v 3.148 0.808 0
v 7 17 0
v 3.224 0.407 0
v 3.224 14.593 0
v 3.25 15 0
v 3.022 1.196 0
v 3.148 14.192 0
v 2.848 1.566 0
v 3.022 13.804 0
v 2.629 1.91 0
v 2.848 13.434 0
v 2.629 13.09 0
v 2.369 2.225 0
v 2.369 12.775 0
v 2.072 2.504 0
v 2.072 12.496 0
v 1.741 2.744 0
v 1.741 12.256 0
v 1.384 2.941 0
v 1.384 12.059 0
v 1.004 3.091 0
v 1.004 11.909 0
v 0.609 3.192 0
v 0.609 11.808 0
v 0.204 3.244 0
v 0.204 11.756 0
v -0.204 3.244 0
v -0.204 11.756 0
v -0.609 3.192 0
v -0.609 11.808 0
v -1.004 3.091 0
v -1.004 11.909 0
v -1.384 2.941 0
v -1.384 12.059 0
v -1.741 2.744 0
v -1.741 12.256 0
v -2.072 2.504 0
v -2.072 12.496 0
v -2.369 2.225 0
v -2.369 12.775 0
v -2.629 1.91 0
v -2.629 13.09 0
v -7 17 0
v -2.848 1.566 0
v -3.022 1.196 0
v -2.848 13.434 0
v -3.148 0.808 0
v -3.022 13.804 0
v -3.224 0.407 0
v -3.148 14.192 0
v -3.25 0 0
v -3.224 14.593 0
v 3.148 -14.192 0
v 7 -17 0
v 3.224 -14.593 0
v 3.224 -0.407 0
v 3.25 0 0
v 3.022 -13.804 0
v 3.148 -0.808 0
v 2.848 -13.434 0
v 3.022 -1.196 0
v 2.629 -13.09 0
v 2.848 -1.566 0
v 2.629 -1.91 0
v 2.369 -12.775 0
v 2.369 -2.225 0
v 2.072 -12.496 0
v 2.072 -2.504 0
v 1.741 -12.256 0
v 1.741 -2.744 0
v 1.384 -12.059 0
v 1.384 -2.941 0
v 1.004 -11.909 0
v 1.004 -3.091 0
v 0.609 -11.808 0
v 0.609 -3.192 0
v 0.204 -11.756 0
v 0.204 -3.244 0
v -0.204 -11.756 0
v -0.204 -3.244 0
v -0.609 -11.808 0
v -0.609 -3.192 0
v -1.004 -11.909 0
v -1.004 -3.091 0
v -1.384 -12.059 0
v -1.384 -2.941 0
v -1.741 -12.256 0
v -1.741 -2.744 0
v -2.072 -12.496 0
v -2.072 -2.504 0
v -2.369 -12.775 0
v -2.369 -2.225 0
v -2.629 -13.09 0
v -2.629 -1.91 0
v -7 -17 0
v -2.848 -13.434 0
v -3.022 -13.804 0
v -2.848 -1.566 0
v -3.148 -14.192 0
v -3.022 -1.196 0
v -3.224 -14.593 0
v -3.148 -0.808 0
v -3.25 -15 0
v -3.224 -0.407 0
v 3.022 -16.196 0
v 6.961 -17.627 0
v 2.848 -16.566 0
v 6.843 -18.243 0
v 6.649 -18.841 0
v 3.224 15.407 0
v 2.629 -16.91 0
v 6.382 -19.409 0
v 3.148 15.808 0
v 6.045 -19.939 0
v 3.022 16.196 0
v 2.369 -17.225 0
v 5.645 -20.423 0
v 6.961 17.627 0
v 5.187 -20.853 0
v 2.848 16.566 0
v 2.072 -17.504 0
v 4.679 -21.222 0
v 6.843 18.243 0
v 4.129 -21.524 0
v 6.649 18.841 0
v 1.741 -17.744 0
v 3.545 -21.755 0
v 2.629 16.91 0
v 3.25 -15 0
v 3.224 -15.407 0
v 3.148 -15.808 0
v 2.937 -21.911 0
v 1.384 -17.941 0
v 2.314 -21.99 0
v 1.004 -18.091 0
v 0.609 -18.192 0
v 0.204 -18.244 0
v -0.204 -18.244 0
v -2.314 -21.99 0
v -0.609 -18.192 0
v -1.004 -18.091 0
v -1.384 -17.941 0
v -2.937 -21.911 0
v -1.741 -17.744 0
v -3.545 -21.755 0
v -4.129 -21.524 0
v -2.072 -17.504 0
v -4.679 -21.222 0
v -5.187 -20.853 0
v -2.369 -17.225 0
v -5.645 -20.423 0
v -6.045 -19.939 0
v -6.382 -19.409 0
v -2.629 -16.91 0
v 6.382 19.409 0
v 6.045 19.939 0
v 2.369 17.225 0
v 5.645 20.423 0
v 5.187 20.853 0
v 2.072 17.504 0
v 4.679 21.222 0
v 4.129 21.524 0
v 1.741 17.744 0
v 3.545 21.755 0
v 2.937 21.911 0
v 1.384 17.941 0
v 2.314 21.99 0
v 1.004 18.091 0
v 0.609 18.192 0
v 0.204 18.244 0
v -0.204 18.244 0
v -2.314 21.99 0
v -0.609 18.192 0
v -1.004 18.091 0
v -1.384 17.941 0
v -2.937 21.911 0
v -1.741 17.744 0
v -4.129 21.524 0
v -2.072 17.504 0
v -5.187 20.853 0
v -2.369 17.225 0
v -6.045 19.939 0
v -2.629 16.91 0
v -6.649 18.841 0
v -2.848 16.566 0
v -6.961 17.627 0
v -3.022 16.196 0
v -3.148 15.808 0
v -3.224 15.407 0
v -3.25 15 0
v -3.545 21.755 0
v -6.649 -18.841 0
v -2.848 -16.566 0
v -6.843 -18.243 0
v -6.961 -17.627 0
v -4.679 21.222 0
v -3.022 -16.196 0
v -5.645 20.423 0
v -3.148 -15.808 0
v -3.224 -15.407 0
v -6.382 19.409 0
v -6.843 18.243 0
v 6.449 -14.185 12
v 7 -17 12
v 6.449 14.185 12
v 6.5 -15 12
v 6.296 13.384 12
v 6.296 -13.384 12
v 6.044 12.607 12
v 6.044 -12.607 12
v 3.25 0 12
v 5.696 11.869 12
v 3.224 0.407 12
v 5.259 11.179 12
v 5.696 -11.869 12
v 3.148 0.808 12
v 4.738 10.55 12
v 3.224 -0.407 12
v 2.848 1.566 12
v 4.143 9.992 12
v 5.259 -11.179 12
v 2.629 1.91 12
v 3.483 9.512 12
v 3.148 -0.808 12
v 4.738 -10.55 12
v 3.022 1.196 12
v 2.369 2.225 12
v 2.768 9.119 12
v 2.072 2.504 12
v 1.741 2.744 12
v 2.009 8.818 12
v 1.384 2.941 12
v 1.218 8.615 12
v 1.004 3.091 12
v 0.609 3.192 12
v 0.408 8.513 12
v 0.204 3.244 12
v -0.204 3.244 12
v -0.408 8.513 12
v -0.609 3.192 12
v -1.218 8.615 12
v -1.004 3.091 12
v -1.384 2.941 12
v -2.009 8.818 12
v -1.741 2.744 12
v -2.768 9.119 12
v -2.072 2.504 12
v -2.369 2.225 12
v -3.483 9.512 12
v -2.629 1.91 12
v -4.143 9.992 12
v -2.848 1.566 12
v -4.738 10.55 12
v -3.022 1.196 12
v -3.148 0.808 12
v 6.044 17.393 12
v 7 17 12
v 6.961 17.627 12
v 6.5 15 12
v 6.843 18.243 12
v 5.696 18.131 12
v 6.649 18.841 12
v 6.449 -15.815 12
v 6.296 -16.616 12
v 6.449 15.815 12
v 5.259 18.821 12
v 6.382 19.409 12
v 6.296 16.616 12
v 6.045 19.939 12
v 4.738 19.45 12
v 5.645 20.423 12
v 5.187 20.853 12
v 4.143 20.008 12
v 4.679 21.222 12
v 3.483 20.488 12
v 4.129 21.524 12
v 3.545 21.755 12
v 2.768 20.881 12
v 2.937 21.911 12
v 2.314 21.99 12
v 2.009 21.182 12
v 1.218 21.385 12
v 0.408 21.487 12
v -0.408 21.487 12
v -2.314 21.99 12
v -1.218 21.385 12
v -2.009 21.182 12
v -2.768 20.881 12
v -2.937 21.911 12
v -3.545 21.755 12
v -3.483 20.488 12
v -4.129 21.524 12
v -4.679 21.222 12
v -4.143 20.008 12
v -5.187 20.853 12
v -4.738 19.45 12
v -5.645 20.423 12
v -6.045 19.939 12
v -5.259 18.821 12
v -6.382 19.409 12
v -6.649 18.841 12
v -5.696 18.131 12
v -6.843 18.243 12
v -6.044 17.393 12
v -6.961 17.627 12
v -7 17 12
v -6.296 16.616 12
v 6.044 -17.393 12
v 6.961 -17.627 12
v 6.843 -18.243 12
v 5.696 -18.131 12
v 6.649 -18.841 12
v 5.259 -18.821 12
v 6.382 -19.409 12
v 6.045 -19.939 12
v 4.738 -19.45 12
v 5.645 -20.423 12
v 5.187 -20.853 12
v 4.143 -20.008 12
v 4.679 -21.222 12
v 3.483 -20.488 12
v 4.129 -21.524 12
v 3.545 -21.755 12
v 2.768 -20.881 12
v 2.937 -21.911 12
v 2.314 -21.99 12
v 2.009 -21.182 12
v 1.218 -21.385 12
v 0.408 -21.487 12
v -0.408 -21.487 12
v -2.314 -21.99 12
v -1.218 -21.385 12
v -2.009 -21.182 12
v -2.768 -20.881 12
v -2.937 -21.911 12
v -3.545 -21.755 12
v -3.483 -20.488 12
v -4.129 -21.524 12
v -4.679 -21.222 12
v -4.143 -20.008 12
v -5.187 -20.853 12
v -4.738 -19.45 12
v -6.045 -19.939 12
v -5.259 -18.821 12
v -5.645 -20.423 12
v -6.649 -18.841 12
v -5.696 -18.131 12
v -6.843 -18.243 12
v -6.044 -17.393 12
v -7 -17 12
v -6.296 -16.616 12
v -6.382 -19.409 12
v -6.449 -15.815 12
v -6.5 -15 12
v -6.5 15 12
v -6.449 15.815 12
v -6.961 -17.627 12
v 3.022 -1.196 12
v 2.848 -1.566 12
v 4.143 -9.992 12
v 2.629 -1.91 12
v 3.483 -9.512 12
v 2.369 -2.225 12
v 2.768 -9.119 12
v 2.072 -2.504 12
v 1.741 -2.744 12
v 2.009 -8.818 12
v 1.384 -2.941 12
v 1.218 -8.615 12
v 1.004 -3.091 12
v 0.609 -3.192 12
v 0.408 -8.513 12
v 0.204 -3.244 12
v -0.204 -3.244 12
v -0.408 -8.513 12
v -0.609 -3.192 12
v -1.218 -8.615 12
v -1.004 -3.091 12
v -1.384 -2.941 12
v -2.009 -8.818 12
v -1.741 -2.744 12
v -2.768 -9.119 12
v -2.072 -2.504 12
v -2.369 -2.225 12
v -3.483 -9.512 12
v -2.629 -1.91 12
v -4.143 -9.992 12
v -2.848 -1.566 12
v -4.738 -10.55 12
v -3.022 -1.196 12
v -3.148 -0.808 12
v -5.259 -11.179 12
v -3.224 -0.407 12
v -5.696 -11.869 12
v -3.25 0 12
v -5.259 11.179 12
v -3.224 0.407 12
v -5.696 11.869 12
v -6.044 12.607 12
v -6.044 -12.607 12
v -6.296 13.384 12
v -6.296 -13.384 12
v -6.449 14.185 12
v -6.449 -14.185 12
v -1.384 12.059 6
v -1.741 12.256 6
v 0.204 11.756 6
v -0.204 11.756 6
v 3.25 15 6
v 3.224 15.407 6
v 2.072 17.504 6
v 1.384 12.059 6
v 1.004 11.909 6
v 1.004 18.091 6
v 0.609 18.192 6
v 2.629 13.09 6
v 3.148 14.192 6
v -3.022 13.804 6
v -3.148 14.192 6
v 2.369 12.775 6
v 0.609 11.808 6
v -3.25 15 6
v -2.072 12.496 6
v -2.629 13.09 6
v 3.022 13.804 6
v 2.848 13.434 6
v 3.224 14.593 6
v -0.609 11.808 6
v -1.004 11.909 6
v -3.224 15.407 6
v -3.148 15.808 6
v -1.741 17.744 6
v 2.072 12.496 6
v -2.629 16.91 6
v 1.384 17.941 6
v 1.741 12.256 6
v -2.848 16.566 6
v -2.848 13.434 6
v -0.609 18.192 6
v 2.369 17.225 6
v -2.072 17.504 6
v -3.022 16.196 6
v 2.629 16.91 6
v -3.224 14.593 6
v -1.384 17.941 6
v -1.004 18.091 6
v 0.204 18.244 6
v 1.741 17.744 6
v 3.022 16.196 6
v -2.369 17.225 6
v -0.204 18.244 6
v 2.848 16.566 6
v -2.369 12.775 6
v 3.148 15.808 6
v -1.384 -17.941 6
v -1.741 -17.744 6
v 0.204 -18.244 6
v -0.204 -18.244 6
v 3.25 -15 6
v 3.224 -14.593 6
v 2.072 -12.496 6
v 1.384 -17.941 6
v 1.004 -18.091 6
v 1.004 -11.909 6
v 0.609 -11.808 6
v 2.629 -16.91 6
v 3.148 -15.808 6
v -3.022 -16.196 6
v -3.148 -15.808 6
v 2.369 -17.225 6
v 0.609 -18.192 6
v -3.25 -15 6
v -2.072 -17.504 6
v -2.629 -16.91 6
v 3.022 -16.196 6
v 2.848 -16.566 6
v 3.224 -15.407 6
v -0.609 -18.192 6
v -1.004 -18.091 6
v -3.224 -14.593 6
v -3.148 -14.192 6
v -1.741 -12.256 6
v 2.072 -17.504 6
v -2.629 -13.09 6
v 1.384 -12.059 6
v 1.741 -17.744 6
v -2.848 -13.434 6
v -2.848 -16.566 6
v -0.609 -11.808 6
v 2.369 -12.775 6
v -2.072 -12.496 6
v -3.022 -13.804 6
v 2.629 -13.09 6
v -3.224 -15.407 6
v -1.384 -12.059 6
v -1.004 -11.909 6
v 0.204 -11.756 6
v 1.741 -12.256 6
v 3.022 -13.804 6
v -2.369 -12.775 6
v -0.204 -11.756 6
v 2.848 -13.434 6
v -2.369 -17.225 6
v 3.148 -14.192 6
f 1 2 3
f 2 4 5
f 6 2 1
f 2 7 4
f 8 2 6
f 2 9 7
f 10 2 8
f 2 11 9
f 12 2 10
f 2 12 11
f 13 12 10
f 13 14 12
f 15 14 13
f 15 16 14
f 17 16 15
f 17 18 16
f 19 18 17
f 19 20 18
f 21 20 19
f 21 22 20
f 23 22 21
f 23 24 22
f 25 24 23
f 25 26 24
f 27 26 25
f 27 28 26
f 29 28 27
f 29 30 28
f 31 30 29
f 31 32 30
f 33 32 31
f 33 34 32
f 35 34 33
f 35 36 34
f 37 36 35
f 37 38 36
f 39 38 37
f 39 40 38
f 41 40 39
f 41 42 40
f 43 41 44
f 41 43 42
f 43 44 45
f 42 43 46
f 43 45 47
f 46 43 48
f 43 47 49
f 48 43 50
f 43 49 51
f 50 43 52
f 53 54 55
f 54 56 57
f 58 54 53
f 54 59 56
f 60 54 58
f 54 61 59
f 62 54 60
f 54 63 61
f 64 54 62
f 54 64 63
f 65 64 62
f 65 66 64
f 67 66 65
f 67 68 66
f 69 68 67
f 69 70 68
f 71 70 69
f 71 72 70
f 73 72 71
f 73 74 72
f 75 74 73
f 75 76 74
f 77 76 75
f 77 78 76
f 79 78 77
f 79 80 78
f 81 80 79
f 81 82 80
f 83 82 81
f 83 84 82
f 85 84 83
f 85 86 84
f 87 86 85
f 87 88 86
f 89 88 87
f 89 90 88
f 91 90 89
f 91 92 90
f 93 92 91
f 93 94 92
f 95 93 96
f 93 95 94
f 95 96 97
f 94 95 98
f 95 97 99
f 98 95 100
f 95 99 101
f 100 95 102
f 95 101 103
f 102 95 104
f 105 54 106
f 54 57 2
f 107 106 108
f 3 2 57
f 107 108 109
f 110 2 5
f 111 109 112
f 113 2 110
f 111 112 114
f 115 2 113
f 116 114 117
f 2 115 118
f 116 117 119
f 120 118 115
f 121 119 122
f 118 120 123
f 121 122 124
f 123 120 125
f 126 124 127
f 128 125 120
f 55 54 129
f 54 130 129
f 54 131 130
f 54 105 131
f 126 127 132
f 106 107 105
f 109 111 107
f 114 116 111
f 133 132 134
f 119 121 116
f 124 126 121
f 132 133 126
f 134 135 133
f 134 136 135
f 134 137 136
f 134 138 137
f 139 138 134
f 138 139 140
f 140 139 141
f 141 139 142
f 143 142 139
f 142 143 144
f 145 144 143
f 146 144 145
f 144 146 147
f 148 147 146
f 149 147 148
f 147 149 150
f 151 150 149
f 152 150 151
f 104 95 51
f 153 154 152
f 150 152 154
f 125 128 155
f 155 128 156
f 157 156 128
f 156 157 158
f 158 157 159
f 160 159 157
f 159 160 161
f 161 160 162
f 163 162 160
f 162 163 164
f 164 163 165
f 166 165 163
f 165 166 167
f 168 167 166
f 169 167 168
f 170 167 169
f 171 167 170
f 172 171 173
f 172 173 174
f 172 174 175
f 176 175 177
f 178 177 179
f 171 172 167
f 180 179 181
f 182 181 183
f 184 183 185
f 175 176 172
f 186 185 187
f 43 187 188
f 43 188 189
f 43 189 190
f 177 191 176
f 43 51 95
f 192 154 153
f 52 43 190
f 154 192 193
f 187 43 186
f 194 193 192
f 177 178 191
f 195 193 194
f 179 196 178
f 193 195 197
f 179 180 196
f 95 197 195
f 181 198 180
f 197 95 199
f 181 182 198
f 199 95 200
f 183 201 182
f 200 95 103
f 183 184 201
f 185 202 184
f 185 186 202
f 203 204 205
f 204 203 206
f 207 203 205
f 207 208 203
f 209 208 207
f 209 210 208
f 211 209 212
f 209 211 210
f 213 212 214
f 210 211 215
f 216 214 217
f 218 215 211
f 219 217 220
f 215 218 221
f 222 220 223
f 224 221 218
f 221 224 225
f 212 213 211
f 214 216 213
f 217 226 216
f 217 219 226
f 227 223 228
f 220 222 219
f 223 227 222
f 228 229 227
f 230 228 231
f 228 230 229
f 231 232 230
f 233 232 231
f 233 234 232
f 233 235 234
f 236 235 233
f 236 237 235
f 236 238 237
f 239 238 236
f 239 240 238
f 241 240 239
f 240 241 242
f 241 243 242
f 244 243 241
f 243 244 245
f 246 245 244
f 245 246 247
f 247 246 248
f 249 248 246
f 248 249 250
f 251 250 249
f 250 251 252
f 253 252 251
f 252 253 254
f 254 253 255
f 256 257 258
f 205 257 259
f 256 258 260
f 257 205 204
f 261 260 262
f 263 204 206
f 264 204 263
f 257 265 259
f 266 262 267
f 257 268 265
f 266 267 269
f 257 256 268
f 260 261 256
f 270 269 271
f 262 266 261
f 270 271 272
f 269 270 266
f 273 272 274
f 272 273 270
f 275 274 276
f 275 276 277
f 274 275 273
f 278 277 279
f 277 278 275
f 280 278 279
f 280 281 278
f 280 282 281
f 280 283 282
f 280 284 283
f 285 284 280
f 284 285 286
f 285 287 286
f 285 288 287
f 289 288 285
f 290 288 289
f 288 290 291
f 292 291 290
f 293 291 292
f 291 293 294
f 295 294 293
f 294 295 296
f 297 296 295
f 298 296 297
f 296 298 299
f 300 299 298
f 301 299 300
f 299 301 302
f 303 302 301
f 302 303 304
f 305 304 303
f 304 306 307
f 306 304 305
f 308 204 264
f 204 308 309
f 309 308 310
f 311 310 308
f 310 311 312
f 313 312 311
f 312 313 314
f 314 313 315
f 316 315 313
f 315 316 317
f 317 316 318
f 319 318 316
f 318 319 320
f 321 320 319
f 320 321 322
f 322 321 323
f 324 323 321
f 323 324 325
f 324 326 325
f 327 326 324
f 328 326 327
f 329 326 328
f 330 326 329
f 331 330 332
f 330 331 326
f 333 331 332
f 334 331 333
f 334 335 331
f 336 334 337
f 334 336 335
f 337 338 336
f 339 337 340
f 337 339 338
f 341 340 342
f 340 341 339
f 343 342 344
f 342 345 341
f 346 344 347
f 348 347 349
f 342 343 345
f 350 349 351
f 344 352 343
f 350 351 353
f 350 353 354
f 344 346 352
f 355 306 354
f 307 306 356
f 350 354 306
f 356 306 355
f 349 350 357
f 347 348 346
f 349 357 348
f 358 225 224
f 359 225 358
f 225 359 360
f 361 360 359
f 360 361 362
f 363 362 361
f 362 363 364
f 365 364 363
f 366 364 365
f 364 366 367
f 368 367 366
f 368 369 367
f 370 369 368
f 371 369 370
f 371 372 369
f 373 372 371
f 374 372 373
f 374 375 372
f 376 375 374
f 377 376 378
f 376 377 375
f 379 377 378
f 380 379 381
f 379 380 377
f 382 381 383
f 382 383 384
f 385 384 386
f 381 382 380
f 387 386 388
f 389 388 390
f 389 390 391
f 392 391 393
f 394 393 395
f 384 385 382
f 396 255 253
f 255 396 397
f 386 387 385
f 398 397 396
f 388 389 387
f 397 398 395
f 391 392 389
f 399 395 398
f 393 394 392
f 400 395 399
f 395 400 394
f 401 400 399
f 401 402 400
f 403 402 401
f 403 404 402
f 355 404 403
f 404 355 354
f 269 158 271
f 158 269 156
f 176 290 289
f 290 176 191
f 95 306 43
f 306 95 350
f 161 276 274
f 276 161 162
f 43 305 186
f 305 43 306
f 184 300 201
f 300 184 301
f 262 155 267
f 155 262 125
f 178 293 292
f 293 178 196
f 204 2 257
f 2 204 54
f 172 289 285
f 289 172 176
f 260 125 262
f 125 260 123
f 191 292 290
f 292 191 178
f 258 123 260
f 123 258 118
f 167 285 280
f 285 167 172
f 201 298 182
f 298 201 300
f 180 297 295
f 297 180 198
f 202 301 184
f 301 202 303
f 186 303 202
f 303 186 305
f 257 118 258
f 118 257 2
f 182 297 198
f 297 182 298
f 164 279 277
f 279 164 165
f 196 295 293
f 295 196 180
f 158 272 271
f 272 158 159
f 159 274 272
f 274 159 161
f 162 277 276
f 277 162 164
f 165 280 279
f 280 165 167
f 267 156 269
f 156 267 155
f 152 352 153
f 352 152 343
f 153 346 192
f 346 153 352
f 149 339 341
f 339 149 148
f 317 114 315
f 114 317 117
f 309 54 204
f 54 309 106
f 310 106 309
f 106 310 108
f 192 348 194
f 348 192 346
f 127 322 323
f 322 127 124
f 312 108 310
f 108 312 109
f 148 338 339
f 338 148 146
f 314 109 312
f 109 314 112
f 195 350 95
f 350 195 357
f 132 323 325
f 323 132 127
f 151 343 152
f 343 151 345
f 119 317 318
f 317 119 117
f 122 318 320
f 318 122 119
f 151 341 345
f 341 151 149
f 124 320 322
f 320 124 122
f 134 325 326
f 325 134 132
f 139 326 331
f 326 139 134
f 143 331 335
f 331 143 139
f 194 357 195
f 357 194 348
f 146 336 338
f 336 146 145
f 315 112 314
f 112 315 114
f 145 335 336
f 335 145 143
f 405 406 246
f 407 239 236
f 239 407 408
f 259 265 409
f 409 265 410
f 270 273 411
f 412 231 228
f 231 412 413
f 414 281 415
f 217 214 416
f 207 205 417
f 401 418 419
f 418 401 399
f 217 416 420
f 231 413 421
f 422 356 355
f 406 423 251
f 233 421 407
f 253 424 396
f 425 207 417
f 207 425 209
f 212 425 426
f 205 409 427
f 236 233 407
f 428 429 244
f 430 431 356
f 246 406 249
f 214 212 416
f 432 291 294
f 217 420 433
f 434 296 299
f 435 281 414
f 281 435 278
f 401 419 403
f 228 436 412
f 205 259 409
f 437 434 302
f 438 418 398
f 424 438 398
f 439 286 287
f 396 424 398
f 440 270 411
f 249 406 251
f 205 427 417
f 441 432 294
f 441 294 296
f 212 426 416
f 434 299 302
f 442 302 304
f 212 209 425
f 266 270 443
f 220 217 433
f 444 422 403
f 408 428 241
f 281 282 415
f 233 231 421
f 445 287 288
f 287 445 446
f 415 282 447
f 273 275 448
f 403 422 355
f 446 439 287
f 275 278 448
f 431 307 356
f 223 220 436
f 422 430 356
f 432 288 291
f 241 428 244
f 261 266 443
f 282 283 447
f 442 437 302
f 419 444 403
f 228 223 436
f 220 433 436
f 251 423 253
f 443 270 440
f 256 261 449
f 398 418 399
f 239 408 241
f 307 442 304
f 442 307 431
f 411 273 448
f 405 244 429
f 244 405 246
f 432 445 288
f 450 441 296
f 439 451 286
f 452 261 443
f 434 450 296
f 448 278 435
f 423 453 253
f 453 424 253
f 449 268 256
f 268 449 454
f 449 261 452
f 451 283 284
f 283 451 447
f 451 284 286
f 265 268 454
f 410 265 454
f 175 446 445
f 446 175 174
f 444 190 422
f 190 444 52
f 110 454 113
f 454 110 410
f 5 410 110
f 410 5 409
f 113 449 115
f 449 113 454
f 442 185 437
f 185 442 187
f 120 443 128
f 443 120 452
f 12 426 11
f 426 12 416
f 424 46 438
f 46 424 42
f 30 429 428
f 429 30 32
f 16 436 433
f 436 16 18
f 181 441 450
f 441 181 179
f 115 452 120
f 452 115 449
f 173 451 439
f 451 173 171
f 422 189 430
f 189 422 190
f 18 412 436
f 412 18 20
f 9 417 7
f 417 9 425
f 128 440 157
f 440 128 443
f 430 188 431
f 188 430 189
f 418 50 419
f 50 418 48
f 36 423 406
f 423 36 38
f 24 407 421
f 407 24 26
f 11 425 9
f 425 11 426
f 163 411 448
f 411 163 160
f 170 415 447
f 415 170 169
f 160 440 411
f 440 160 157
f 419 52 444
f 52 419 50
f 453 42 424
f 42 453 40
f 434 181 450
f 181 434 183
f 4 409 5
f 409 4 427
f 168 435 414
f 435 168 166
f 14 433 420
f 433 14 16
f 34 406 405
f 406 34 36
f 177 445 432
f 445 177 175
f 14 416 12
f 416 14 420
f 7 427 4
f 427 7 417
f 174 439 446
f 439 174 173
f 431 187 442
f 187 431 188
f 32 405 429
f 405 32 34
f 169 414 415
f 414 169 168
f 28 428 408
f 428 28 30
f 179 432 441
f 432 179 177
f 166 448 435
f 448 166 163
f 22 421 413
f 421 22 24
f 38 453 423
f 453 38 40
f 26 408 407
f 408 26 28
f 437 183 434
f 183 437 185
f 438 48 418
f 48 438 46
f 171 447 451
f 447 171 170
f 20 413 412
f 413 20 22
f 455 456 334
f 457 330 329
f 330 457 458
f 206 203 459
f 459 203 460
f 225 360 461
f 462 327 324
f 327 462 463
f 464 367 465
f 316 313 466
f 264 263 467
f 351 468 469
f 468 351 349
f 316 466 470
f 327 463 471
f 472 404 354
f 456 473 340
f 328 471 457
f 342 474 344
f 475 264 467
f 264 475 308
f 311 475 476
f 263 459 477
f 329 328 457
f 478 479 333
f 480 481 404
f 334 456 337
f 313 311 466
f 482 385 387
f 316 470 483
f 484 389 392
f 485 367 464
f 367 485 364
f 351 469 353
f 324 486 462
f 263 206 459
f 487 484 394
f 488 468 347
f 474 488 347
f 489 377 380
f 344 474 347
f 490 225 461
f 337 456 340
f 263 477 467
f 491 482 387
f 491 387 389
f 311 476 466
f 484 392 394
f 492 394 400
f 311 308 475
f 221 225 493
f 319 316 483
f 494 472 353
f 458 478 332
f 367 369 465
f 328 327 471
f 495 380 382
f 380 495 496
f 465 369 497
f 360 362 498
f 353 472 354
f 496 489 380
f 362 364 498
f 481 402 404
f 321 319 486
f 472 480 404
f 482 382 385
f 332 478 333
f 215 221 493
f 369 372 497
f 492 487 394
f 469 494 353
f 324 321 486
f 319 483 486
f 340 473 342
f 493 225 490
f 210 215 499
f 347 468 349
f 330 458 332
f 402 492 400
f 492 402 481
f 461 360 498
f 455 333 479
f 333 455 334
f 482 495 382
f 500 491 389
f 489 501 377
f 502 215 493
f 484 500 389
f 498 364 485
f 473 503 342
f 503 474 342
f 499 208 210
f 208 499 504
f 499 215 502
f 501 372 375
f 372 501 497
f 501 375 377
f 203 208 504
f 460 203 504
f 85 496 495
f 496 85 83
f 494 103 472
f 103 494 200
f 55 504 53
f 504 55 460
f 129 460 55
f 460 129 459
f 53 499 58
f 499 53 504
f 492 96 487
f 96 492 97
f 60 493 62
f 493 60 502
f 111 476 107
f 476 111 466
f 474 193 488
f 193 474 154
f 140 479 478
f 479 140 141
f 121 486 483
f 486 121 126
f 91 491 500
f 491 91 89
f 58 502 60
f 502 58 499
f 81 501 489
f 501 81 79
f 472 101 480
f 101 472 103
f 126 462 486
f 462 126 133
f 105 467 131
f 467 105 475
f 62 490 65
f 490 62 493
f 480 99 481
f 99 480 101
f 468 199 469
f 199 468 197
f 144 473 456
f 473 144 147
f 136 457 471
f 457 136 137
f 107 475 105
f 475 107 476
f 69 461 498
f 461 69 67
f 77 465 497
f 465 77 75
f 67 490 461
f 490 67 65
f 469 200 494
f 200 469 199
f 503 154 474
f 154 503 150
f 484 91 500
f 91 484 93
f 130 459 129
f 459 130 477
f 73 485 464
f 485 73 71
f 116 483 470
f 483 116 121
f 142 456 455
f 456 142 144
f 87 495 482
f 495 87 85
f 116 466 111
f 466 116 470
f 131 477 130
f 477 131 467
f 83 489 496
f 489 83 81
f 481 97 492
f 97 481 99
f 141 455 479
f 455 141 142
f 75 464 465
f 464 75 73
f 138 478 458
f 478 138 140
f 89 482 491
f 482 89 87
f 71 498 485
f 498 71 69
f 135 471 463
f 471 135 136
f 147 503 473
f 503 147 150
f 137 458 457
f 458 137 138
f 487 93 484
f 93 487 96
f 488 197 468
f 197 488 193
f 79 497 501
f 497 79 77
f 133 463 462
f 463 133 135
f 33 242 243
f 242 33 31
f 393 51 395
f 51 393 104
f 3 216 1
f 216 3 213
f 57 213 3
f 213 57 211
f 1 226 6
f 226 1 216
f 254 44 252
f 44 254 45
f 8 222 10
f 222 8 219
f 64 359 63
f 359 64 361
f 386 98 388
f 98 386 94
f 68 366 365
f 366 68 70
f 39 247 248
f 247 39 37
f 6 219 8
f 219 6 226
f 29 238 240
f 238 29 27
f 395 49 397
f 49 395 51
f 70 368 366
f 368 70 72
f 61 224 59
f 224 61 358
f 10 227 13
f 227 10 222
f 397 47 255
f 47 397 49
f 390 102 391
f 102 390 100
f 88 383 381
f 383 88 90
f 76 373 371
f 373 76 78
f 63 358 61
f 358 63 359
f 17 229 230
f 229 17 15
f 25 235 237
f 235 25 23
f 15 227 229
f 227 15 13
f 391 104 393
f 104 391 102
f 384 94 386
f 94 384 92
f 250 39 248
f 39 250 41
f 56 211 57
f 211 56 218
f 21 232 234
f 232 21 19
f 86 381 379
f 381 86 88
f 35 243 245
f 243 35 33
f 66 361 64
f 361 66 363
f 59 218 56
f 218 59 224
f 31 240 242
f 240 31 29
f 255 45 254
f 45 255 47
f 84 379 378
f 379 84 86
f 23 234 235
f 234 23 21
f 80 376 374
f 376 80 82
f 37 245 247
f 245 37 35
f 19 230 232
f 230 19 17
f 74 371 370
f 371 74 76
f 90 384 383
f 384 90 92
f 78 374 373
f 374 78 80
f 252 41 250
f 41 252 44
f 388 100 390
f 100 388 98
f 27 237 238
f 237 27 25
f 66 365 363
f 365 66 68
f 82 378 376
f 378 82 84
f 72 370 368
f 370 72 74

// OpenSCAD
$fn = 50;


difference() {
	union() {
		cylinder(h = 12, r = 7.0000000000);
		translate(v = [0.0000000000, 7.5000000000, 0]) {
			hull() {
				translate(v = [-2.0000000000, 9.5000000000, 0]) {
					cylinder(h = 12, r = 5);
				}
				translate(v = [2.0000000000, 9.5000000000, 0]) {
					cylinder(h = 12, r = 5);
				}
				translate(v = [-2.0000000000, -9.5000000000, 0]) {
					cylinder(h = 12, r = 5);
				}
				translate(v = [2.0000000000, -9.5000000000, 0]) {
					cylinder(h = 12, r = 5);
				}
			}
		}
		translate(v = [0.0000000000, 7.5000000000, 0]) {
			hull() {
				translate(v = [-2.0000000000, 9.5000000000, 0]) {
					cylinder(h = 12, r = 5);
				}
				translate(v = [2.0000000000, 9.5000000000, 0]) {
					cylinder(h = 12, r = 5);
				}
				translate(v = [-2.0000000000, -9.5000000000, 0]) {
					cylinder(h = 12, r = 5);
				}
				translate(v = [2.0000000000, -9.5000000000, 0]) {
					cylinder(h = 12, r = 5);
				}
			}
		}
		translate(v = [0.0000000000, -7.5000000000, 0]) {
			hull() {
				translate(v = [-2.0000000000, 9.5000000000, 0]) {
					cylinder(h = 12, r = 5);
				}
				translate(v = [2.0000000000, 9.5000000000, 0]) {
					cylinder(h = 12, r = 5);
				}
				translate(v = [-2.0000000000, -9.5000000000, 0]) {
					cylinder(h = 12, r = 5);
				}
				translate(v = [2.0000000000, -9.5000000000, 0]) {
					cylinder(h = 12, r = 5);
				}
			}
		}
		translate(v = [0.0000000000, -7.5000000000, 0]) {
			hull() {
				translate(v = [-2.0000000000, 9.5000000000, 0]) {
					cylinder(h = 12, r = 5);
				}
				translate(v = [2.0000000000, 9.5000000000, 0]) {
					cylinder(h = 12, r = 5);
				}
				translate(v = [-2.0000000000, -9.5000000000, 0]) {
					cylinder(h = 12, r = 5);
				}
				translate(v = [2.0000000000, -9.5000000000, 0]) {
					cylinder(h = 12, r = 5);
				}
			}
		}
	}
	union() {
		translate(v = [0.0000000000, 15.0000000000, 12]) {
			rotate(a = [0, 0, 0]) {
				difference() {
					union() {
						#translate(v = [0, 0, -12.0000000000]) {
							cylinder(h = 12, r = 2.2500000000);
						}
						#translate(v = [0, 0, -6]) {
							cylinder(h = 6, r1 = 3.2500000000, r2 = 6.5000000000);
						}
						#translate(v = [0, 0, -12.0000000000]) {
							cylinder(h = 12, r = 3.2500000000);
						}
						#translate(v = [0, 0, -12.0000000000]) {
							cylinder(h = 12, r = 2.2500000000);
						}
					}
					union();
				}
			}
		}
		translate(v = [0.0000000000, 15.0000000000, 12]) {
			rotate(a = [0, 0, 0]) {
				difference() {
					union() {
						#translate(v = [0, 0, -12.0000000000]) {
							cylinder(h = 12, r = 2.2500000000);
						}
						#translate(v = [0, 0, -6]) {
							cylinder(h = 6, r1 = 3.2500000000, r2 = 6.5000000000);
						}
						#translate(v = [0, 0, -12.0000000000]) {
							cylinder(h = 12, r = 3.2500000000);
						}
						#translate(v = [0, 0, -12.0000000000]) {
							cylinder(h = 12, r = 2.2500000000);
						}
					}
					union();
				}
			}
		}
		translate(v = [0.0000000000, -15.0000000000, 12]) {
			rotate(a = [0, 0, 0]) {
				difference() {
					union() {
						#translate(v = [0, 0, -12.0000000000]) {
							cylinder(h = 12, r = 2.2500000000);
						}
						#translate(v = [0, 0, -6]) {
							cylinder(h = 6, r1 = 3.2500000000, r2 = 6.5000000000);
						}
						#translate(v = [0, 0, -12.0000000000]) {
							cylinder(h = 12, r = 3.2500000000);
						}
						#translate(v = [0, 0, -12.0000000000]) {
							cylinder(h = 12, r = 2.2500000000);
						}
					}
					union();
				}
			}
		}
		translate(v = [0.0000000000, -15.0000000000, 12]) {
			rotate(a = [0, 0, 0]) {
				difference() {
					union() {
						#translate(v = [0, 0, -12.0000000000]) {
							cylinder(h = 12, r = 2.2500000000);
						}
						#translate(v = [0, 0, -6]) {
							cylinder(h = 6, r1 = 3.2500000000, r2 = 6.5000000000);
						}
						#translate(v = [0, 0, -12.0000000000]) {
							cylinder(h = 12, r = 3.2500000000);
						}
						#translate(v = [0, 0, -12.0000000000]) {
							cylinder(h = 12, r = 2.2500000000);
						}
					}
					union();
				}
			}
		}
		translate(v = [0, 0, -100]) {
			cylinder(h = 200, r = 3.2500000000);
		}
		translate(v = [0, 0, -100]) {
			cylinder(h = 200, r = 1.8000000000);
		}
	}
}
